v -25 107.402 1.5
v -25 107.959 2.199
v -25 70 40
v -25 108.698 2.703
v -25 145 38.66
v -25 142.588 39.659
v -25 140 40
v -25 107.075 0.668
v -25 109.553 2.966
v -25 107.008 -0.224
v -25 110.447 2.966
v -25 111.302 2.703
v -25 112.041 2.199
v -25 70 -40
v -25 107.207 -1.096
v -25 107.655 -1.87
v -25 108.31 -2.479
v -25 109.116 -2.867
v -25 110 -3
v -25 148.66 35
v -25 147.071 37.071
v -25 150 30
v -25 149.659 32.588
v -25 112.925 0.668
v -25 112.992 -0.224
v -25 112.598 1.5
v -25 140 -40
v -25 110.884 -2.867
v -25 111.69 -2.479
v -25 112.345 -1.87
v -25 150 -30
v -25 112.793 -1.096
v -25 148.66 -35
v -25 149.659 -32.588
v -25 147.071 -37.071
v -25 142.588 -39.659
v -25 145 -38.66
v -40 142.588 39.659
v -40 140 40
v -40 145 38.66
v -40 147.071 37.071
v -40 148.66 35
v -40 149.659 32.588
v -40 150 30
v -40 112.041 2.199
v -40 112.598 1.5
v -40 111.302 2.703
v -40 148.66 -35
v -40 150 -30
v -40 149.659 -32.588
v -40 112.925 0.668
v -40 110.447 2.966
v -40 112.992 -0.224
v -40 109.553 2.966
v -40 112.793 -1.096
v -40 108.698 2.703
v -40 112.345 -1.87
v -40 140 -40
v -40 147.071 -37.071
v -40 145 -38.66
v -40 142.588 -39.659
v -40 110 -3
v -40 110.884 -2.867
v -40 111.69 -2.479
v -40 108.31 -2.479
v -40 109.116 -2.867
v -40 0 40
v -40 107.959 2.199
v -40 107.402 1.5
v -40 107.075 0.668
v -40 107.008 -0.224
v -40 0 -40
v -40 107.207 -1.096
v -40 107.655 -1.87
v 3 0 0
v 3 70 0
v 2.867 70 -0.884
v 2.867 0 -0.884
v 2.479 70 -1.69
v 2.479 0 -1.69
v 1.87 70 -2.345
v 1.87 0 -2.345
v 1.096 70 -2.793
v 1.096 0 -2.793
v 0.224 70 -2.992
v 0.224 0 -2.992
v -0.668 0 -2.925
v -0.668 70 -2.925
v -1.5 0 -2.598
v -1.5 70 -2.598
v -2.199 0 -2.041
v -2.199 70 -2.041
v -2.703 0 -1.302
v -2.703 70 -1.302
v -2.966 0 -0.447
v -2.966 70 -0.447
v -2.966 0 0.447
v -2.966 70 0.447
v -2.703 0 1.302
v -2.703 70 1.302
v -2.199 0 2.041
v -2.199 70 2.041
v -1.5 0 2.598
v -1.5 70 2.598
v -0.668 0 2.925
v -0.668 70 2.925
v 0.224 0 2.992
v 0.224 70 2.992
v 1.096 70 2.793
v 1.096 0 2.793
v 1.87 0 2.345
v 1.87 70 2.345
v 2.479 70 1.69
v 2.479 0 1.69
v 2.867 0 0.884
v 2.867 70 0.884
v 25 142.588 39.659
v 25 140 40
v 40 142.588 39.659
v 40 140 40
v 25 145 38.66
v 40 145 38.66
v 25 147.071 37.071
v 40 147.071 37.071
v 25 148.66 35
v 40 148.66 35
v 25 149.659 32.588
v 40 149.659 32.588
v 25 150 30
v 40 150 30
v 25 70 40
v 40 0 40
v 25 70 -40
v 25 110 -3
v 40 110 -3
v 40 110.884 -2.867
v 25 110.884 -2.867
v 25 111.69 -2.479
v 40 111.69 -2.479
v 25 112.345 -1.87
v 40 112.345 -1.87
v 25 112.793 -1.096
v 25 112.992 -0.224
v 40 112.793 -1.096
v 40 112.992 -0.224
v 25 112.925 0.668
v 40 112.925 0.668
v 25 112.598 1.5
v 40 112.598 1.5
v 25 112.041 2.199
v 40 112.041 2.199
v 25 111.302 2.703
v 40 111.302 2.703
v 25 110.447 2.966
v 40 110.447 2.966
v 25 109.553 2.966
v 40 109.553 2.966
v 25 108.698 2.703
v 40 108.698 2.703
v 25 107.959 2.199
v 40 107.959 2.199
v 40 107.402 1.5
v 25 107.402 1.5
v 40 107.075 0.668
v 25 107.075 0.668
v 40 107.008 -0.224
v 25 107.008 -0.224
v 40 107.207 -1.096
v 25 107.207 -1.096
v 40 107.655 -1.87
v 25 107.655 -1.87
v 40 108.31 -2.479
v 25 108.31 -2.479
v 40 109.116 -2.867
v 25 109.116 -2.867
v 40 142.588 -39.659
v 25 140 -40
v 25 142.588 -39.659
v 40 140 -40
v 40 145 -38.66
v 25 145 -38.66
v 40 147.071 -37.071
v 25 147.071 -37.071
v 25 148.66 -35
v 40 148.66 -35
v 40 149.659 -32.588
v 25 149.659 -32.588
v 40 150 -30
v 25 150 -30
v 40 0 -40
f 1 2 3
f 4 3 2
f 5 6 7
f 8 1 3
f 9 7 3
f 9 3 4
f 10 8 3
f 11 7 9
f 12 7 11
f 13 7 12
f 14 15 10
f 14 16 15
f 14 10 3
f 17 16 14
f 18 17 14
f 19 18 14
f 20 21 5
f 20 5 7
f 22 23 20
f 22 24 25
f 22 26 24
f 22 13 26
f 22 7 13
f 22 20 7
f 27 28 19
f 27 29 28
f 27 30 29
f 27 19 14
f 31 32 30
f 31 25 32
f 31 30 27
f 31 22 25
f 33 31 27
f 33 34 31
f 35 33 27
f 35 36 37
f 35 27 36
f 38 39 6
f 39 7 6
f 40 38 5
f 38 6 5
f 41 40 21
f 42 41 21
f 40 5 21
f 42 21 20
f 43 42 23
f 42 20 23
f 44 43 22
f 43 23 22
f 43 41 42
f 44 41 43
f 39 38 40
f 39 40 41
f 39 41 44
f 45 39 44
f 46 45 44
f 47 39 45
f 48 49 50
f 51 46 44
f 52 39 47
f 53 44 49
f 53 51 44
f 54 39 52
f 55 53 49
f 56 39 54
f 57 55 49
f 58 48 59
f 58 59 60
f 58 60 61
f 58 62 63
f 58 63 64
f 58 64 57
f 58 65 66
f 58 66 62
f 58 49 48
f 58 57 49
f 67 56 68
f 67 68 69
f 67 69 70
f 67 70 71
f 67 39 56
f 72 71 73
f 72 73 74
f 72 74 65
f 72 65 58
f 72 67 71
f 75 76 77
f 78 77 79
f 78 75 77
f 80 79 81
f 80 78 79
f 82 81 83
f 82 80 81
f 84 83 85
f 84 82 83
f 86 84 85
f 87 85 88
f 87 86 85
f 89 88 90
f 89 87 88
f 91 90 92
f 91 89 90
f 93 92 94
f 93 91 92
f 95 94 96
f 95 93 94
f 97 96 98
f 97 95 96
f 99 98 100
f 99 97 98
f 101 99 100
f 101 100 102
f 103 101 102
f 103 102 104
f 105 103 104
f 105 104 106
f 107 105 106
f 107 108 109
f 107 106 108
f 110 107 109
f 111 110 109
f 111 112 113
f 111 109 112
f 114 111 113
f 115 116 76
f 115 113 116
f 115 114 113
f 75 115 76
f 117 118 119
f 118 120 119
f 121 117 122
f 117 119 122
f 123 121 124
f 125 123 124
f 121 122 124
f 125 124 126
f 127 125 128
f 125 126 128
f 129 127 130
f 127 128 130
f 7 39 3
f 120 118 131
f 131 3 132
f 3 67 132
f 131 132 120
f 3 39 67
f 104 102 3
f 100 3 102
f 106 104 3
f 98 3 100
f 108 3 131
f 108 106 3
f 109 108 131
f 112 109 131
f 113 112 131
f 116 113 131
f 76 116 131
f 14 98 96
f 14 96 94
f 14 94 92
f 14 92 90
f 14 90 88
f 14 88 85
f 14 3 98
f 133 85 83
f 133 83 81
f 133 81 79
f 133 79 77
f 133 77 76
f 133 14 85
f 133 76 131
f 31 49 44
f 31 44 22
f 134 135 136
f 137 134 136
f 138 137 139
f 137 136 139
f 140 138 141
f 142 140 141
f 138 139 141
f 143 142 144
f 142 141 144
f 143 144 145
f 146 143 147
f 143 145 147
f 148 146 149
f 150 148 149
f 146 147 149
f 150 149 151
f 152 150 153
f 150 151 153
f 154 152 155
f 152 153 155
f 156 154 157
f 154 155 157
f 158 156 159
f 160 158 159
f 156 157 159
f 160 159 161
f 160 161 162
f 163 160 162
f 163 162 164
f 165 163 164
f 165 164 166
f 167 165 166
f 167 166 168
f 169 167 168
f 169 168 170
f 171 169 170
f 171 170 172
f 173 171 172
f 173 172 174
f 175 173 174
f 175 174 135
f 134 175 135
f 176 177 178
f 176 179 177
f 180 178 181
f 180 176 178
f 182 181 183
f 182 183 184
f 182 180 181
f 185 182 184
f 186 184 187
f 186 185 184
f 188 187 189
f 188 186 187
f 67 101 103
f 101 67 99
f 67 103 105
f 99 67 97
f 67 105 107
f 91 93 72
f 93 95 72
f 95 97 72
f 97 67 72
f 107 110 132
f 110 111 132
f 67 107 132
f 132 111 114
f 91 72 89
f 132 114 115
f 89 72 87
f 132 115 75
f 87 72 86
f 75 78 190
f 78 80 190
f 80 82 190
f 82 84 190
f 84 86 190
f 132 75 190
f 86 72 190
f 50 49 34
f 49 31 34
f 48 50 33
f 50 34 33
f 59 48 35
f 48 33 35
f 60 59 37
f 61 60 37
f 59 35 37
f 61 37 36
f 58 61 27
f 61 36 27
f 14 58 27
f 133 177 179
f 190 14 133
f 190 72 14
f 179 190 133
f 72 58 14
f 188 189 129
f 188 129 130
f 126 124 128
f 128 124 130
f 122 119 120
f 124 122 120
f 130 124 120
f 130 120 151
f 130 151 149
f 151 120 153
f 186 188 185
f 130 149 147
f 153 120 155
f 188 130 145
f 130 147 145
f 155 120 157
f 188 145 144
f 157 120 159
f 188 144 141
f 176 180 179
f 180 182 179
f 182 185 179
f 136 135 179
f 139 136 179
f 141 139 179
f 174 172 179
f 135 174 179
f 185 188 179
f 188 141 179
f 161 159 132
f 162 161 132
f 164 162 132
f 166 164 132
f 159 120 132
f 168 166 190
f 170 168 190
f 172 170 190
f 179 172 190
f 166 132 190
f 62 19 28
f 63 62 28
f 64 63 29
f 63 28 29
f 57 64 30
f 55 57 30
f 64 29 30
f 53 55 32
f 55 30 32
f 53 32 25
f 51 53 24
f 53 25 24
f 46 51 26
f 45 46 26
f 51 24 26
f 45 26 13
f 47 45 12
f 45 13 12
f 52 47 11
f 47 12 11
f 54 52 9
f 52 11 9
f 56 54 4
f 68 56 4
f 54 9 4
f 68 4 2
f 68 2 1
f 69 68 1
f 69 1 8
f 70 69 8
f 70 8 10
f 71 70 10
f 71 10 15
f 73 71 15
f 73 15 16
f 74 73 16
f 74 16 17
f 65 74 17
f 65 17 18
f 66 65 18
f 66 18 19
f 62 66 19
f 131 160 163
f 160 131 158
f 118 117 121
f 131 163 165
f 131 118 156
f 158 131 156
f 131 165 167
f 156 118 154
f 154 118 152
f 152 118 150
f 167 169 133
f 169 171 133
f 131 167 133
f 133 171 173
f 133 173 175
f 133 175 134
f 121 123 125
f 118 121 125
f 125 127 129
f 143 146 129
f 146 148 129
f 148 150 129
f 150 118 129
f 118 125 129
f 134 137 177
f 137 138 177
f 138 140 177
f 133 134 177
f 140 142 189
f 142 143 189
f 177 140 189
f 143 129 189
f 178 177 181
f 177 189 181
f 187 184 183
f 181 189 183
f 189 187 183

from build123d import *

# Parameters (mm, degrees)
SKETCH1_W               = 80
SKETCH1_H               = 80
SKETCH1_R               = 3
BOSS_EXTRUDE1_DEPTH     = 150
SKETCH2_W               = 50
SKETCH2_H               = 80
CUT_EXTRUDE1_DEPTH      = 80
SKETCH3_R               = 3
CUT_EXTRUDE2_DEPTH      = 1
CUT_EXTRUDE2_DEPTH_BACK = 81
FILLET1_R               = 10


with BuildPart() as part:
    # Sketch1 → Boss-Extrude1 (new body)
    with BuildSketch(Plane(origin=(0, 0, 0), x_dir=(1, 0, 0), z_dir=(0, 1, 0))):
        Rectangle(SKETCH1_W, SKETCH1_H)
        Circle(SKETCH1_R, mode=Mode.SUBTRACT)
    extrude(amount=BOSS_EXTRUDE1_DEPTH)

    # Sketch2 → Cut-Extrude1 (cut)
    with BuildSketch(Plane(origin=(0, 150, 0), x_dir=(1, 0, 0), z_dir=(0, 1, 0))):
        Rectangle(SKETCH2_W, SKETCH2_H)
    extrude(amount=-CUT_EXTRUDE1_DEPTH, mode=Mode.SUBTRACT)

    # Sketch3 → Cut-Extrude2 (cut, two sides)
    with BuildSketch(Plane(origin=(40, 0, 0), x_dir=(0, 0, -1), z_dir=(1, 0, 0))) as cut_extrude2_sk:
        with Locations((0, 110)):
            Circle(SKETCH3_R)
    extrude(amount=CUT_EXTRUDE2_DEPTH, mode=Mode.SUBTRACT)
    extrude(cut_extrude2_sk.sketch, amount=-CUT_EXTRUDE2_DEPTH_BACK, mode=Mode.SUBTRACT)

    # Fillet1
    fillet1_edges = [part.edges().sort_by_distance(p)[0] for p in [
        (-32.5, 150, 40),
        (32.5, 150, 40),
        (-32.5, 150, -40),
        (32.5, 150, -40),
    ]]
    fillet(fillet1_edges, radius=FILLET1_R)


solid = part.part
